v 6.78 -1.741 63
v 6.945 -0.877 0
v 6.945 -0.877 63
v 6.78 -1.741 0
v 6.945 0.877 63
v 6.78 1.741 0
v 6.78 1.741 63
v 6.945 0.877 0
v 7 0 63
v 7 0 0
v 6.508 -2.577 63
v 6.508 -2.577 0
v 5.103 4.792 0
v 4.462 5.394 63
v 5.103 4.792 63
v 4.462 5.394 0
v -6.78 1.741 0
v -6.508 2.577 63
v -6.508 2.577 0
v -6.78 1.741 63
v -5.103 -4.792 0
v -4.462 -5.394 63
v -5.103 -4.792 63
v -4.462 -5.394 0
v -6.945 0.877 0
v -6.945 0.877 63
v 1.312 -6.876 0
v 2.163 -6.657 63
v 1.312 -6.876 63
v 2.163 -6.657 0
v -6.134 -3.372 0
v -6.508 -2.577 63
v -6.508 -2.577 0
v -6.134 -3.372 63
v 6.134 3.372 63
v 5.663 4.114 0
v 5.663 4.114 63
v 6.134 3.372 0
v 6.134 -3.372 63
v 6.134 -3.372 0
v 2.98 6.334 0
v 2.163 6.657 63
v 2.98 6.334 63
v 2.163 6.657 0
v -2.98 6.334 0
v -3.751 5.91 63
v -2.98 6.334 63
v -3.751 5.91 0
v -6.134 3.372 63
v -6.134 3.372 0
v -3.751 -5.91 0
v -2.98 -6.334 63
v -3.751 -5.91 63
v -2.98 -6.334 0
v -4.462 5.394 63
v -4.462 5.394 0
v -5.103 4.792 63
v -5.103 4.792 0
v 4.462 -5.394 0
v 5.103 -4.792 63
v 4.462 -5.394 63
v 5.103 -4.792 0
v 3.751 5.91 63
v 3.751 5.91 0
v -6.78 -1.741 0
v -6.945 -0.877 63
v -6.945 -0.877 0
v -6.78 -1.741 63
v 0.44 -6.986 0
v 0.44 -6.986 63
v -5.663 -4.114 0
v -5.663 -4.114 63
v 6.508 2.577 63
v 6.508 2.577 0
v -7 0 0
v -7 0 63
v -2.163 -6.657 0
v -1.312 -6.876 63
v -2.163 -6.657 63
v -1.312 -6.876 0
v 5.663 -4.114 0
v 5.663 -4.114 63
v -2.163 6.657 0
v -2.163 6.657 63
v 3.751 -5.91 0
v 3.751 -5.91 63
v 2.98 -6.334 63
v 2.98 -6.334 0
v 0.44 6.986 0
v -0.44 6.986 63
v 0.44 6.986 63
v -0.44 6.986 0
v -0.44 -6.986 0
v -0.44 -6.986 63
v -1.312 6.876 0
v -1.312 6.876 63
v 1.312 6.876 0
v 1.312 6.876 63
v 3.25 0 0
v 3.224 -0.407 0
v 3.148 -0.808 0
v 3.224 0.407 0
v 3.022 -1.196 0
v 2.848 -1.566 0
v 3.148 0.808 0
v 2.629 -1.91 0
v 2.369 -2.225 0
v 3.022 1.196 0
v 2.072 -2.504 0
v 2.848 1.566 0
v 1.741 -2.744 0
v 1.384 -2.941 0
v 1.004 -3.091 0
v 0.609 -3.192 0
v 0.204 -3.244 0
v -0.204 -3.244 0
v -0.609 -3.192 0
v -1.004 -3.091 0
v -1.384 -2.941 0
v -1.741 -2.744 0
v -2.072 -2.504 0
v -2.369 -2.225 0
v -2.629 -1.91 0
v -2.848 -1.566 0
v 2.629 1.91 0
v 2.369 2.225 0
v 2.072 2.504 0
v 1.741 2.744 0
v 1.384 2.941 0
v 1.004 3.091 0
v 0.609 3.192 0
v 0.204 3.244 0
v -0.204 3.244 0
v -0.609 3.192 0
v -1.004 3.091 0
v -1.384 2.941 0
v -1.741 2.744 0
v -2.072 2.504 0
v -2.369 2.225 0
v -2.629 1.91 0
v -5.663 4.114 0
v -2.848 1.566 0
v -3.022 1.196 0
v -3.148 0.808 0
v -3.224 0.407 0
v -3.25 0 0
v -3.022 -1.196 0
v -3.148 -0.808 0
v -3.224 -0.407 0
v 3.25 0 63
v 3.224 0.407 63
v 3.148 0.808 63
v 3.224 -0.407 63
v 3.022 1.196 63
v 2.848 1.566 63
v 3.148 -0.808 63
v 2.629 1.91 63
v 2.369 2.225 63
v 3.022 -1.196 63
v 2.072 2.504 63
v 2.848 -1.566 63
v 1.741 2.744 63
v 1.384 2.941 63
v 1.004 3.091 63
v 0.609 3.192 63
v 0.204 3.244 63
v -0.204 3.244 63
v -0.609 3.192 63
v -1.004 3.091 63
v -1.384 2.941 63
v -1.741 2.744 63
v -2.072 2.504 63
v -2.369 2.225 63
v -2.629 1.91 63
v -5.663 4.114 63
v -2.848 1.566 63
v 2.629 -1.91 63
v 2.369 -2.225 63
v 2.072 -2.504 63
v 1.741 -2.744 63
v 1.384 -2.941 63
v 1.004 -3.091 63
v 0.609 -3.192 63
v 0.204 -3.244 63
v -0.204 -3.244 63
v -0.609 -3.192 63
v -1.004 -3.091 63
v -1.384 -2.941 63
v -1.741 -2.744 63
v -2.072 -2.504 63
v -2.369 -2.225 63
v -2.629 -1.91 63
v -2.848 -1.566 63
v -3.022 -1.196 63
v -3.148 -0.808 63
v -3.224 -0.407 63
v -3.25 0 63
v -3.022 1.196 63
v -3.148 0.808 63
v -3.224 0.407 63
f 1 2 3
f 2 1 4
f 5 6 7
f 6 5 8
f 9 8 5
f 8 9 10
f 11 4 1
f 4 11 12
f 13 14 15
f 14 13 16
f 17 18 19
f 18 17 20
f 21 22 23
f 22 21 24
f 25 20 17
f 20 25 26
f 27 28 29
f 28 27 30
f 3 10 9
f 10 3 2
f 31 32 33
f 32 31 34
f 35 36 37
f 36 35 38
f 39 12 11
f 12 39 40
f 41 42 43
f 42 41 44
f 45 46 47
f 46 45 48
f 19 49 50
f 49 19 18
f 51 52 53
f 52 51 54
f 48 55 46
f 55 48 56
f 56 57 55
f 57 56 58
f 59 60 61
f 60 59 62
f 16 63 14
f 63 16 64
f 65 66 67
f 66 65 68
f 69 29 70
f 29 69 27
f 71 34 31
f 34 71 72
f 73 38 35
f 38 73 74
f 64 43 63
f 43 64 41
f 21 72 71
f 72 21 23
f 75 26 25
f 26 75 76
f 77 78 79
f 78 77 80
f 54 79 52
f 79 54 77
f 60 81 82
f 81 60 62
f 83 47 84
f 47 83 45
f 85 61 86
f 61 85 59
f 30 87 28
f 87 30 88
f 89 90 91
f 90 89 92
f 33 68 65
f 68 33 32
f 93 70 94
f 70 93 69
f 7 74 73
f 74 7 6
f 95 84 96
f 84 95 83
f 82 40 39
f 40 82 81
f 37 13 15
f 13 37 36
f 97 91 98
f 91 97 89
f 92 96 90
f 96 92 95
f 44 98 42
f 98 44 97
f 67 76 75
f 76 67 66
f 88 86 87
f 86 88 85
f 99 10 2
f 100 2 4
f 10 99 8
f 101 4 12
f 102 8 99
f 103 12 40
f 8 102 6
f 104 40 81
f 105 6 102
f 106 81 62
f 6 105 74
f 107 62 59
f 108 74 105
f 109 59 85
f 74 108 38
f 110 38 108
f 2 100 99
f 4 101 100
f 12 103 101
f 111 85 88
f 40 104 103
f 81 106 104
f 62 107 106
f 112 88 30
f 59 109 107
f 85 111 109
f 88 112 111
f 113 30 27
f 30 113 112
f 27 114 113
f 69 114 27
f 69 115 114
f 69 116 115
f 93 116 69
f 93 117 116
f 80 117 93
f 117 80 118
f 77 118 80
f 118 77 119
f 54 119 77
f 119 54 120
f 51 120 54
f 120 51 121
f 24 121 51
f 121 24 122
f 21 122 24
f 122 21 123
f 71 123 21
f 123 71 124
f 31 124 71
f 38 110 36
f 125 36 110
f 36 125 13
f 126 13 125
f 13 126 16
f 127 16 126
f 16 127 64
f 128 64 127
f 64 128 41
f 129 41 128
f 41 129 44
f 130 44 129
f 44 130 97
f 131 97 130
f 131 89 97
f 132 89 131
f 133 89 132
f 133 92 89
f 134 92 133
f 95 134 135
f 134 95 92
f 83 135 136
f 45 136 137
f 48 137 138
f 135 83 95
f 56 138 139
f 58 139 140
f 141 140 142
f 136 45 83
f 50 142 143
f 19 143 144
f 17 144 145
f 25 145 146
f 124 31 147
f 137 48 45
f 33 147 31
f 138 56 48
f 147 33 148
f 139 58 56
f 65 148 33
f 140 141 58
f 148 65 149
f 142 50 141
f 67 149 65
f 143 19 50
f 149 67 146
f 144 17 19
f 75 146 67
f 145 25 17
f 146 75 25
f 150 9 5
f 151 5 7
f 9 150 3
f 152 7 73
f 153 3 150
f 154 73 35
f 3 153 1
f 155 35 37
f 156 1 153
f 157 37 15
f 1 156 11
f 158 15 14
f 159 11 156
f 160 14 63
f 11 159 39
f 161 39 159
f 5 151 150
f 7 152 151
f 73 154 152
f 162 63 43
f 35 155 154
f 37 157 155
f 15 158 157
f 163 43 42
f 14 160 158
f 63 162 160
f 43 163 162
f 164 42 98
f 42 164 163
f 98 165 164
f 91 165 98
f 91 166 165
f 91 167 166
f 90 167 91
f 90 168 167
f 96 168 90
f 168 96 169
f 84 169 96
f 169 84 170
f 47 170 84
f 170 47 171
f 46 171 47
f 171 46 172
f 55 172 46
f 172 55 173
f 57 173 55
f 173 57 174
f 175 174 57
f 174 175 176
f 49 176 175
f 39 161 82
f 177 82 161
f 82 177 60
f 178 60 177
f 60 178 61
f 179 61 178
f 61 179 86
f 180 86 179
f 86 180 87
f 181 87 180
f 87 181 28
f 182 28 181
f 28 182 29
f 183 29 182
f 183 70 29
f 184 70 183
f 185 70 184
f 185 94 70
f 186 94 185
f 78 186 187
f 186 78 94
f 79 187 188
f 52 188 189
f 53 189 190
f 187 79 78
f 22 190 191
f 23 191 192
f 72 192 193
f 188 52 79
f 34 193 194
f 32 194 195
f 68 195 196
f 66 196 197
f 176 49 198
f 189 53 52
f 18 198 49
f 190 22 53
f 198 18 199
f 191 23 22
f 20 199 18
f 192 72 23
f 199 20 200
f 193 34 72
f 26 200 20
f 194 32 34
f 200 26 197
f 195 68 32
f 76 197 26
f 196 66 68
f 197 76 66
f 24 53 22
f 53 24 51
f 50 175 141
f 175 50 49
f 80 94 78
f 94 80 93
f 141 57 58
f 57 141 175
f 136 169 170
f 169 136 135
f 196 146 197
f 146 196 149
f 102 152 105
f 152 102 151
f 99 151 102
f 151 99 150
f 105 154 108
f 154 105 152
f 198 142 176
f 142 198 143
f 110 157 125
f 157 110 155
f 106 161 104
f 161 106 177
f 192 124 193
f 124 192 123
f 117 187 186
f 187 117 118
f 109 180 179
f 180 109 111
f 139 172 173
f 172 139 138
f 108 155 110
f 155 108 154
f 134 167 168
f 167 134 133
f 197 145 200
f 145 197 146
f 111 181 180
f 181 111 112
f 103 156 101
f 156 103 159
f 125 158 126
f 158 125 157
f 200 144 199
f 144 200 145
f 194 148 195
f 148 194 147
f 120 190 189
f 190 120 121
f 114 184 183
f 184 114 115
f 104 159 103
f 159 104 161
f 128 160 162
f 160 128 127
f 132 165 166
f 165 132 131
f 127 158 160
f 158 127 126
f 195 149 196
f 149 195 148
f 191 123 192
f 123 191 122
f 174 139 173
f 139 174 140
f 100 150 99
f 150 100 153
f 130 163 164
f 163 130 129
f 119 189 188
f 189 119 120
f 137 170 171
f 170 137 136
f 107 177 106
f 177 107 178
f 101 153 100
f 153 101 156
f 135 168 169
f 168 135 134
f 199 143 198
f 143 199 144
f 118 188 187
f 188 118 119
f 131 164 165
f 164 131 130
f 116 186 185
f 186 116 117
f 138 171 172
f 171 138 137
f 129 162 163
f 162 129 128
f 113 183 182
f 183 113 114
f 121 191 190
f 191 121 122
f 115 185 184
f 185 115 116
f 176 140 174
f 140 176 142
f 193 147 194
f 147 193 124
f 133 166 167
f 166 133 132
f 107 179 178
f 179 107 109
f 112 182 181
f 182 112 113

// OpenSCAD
$fn = 50;


difference() {
	union() {
		cylinder(h = 63, r = 7.0000000000);
	}
	union() {
		translate(v = [0.0000000000, 0.0000000000, -100.0000000000]) {
			cylinder(h = 200, r = 3.2500000000);
		}
	}
}
